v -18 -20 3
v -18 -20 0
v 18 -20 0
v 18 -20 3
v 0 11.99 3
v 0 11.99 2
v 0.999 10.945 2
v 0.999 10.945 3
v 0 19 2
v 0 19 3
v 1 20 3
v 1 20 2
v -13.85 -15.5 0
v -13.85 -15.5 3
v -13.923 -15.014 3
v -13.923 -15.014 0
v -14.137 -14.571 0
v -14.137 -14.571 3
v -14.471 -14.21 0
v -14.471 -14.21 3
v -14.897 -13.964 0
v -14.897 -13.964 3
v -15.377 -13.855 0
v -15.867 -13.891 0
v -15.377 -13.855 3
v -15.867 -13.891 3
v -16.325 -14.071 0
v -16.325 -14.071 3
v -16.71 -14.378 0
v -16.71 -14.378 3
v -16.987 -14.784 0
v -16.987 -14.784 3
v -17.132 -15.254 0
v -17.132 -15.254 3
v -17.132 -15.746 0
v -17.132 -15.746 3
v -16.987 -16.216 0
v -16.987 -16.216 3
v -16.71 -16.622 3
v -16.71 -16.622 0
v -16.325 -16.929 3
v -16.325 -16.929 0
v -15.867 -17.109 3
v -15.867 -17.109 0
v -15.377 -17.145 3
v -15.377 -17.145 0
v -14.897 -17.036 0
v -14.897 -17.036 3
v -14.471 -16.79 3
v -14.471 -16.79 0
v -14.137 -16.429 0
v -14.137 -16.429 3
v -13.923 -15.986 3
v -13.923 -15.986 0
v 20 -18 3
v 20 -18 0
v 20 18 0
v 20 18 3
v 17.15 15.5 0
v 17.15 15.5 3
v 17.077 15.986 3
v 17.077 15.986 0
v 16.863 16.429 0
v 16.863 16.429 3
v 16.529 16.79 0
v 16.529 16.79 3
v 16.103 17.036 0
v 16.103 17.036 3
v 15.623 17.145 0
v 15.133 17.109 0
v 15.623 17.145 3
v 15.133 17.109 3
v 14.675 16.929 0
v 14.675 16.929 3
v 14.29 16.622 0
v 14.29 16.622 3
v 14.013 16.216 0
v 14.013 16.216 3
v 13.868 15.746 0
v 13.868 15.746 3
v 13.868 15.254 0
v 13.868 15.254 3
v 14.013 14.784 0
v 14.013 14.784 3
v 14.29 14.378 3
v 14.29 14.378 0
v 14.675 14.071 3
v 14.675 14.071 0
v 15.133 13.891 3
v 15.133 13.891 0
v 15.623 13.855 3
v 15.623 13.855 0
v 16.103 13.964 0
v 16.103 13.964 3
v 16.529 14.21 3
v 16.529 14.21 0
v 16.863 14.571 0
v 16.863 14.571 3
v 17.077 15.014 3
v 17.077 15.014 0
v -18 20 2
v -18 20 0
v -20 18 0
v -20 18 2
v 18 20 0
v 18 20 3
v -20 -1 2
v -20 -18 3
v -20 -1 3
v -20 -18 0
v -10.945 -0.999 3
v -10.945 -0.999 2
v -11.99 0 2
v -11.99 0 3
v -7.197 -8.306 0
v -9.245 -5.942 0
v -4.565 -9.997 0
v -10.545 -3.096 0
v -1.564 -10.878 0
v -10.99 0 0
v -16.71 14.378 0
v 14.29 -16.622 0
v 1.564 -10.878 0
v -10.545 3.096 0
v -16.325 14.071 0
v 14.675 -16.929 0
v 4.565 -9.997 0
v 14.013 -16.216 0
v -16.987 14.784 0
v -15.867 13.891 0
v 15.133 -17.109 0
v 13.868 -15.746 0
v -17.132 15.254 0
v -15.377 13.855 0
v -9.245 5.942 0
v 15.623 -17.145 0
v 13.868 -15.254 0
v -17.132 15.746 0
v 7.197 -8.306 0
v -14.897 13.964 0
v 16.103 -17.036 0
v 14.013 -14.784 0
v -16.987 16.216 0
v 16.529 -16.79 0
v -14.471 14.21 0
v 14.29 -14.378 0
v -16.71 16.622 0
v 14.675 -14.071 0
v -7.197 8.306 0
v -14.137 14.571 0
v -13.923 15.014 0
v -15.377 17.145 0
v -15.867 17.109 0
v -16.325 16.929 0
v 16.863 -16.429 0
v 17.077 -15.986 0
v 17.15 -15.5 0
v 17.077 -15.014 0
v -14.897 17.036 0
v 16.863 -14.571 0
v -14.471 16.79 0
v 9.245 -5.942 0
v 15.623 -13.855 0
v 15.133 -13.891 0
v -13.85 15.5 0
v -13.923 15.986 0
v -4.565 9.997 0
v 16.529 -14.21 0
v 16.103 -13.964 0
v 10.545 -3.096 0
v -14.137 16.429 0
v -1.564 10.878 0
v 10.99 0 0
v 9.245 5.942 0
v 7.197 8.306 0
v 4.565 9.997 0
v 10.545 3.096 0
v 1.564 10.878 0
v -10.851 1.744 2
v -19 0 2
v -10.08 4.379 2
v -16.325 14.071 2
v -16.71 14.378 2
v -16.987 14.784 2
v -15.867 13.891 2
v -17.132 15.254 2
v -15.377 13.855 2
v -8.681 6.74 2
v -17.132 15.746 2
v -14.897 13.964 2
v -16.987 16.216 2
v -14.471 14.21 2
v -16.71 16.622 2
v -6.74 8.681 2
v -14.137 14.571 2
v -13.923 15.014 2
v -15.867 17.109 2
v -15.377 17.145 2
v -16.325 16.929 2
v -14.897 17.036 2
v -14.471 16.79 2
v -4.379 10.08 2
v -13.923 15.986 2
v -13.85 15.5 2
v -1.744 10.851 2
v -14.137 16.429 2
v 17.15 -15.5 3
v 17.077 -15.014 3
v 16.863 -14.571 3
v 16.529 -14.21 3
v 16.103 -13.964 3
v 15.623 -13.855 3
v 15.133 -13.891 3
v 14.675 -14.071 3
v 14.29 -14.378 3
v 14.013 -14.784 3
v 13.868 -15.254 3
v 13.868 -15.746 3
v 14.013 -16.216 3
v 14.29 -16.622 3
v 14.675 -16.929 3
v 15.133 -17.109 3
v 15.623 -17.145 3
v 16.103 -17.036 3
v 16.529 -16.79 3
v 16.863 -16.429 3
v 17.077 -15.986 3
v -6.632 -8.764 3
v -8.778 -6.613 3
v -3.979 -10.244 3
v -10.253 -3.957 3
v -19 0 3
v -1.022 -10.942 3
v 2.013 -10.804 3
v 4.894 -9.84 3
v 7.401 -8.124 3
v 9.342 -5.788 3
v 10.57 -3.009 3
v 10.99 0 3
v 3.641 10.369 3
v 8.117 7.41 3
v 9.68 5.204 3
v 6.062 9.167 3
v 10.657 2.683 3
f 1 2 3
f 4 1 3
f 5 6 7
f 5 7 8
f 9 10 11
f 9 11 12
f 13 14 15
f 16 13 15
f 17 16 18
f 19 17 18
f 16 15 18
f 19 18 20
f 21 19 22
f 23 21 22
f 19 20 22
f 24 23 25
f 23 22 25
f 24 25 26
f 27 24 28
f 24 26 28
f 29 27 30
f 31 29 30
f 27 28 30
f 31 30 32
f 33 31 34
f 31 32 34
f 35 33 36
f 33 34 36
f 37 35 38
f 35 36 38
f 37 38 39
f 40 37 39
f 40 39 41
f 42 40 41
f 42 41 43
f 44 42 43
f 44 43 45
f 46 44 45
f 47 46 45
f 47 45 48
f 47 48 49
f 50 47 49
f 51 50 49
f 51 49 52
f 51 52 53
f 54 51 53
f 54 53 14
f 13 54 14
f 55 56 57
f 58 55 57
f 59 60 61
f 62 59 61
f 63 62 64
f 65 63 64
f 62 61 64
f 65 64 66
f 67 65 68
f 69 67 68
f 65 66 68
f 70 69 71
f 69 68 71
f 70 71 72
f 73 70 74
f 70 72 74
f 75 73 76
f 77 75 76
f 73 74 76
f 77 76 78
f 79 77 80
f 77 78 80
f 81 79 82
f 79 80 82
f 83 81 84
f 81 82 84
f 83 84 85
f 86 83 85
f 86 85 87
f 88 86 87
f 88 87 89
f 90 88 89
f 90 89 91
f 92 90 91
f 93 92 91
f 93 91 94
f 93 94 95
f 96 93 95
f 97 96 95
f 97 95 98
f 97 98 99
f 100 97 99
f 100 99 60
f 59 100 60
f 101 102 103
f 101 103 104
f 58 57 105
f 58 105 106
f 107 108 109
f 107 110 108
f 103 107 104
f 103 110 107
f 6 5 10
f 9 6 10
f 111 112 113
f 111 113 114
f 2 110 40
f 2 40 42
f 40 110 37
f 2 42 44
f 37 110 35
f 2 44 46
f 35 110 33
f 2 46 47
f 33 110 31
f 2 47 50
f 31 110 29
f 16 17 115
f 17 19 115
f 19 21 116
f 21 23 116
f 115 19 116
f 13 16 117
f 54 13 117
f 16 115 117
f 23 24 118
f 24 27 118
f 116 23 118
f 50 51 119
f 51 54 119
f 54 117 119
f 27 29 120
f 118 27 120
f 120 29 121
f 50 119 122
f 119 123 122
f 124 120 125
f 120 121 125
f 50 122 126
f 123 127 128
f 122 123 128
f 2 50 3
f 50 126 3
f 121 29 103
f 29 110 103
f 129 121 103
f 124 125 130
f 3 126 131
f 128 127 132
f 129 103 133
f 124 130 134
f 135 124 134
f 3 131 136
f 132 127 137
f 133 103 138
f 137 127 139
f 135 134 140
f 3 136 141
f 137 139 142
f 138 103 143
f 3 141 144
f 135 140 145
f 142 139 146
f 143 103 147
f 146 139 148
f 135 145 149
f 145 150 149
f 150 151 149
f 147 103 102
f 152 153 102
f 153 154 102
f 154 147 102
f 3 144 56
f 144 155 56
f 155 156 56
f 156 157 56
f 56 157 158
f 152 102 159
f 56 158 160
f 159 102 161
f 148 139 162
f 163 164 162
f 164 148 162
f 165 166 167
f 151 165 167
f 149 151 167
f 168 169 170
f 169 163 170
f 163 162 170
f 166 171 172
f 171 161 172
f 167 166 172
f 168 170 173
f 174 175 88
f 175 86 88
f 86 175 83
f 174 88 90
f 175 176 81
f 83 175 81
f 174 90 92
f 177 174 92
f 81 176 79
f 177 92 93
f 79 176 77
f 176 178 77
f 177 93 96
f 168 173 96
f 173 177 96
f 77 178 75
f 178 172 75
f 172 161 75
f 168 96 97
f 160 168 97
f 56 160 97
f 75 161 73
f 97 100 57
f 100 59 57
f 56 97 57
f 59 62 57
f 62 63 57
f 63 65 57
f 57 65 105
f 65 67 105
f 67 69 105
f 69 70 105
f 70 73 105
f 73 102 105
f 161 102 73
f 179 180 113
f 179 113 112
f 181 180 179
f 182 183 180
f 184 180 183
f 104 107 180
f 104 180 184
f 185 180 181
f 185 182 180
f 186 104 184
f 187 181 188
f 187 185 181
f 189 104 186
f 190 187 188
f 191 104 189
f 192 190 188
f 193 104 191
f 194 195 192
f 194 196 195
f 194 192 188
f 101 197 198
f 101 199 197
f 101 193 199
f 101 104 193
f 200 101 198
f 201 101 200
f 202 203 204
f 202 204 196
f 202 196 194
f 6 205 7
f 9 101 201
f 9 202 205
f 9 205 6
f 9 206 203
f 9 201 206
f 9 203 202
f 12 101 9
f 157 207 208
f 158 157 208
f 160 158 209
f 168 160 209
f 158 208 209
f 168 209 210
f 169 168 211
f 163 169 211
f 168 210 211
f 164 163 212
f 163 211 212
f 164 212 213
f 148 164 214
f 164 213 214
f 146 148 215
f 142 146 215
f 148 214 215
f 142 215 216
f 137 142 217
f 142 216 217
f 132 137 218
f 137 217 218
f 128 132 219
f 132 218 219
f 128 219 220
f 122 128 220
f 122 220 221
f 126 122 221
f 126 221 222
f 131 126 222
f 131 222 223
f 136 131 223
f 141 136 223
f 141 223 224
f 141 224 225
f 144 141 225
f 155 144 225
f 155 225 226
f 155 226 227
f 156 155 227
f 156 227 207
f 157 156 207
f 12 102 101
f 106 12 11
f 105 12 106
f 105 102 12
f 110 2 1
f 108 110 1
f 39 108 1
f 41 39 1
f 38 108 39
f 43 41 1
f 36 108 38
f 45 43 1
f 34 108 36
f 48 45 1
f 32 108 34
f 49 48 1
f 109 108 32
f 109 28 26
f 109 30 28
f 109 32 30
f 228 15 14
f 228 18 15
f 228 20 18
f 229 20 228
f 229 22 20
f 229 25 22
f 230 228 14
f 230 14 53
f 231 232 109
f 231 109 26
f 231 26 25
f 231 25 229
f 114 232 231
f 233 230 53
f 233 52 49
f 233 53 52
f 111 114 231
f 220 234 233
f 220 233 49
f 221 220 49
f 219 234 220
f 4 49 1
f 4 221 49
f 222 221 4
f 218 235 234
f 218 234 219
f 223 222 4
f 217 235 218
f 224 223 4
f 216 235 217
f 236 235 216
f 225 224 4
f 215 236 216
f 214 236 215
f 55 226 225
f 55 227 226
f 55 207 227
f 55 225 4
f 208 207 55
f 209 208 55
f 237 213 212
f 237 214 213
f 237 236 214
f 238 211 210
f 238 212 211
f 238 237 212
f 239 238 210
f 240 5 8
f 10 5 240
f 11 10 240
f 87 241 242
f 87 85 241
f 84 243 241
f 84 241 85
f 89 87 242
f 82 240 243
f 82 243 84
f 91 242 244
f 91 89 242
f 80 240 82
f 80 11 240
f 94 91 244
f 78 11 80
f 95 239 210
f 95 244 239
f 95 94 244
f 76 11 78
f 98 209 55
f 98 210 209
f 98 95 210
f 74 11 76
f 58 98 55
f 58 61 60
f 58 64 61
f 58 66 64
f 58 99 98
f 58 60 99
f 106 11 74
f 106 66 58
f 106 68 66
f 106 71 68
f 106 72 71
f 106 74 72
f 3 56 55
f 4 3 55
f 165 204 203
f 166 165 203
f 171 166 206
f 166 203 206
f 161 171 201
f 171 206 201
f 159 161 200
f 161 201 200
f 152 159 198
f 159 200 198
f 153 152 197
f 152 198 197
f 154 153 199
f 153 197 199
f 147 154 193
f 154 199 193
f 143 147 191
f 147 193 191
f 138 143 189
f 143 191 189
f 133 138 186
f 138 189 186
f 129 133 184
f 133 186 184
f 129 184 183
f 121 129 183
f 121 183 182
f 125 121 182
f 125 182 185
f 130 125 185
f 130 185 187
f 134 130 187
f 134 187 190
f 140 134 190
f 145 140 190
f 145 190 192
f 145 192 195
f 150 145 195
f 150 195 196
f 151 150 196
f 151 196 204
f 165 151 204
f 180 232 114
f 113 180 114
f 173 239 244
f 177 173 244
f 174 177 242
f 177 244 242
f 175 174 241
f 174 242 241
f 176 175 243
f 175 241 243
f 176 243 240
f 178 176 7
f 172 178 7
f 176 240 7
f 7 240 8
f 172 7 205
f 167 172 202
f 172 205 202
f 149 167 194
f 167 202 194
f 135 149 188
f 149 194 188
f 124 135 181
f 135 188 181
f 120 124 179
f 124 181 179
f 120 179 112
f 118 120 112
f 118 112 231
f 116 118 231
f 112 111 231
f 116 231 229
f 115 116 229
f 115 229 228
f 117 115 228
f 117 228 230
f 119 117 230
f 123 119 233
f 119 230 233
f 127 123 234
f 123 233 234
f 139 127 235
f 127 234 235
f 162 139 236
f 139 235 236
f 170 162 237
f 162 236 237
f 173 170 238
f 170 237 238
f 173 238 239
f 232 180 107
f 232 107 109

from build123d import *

# Parameters (mm, degrees)
SKETCH_W        = 40
SKETCH_H        = 40
PAD_DEPTH       = 3
SKETCH001_R     = 10.99
SKETCH001_R_2   = 1.65
POCKET_DEPTH    = 5
SKETCH003_W     = 37.54295
SKETCH003_H     = 30.927837
POCKET001_DEPTH = 1
CHAMFER_SIZE    = 2
CHAMFER001_SIZE = 1


with BuildPart() as part:
    # Sketch → Pad (new body)
    with BuildSketch(Plane.XY):
        Rectangle(SKETCH_W, SKETCH_H)
    extrude(amount=PAD_DEPTH)

    # Sketch001 (on Face6 of Pad) → Pocket (cut)
    with BuildSketch(Plane.XY.offset(3)):
        Circle(SKETCH001_R)
        with Locations((-15.5, 15.5)):
            Circle(SKETCH001_R_2)
        with Locations((15.5, 15.5)):
            Circle(SKETCH001_R_2)
        with Locations((-15.5, -15.5)):
            Circle(SKETCH001_R_2)
        with Locations((15.5, -15.5)):
            Circle(SKETCH001_R_2)
    extrude(amount=-POCKET_DEPTH, mode=Mode.SUBTRACT)

    # Sketch003 (on Face5 of Pocket) → Pocket001 (cut)
    with BuildSketch(Plane.XY.offset(3)):
        with Locations((-18.771475, 15.463919)):
            Rectangle(SKETCH003_W, SKETCH003_H)
    extrude(amount=-POCKET001_DEPTH, mode=Mode.SUBTRACT)

    # Chamfer
    chamfer_edges = [part.edges().sort_by_distance(p)[0] for p in [
        (-20, -20, 1.5),
        (20, -20, 1.5),
        (20, 20, 1.5),
        (-20, 20, 1),
    ]]
    chamfer(chamfer_edges, length=CHAMFER_SIZE)

    # Chamfer001
    chamfer001_edges = [part.edges().sort_by_distance(p)[0] for p in [
        (-10.99, 0, 2.5),
        (0, 20, 2.5),
        (0, 10.99, 2.5),
        (-20, 0, 2.5),
    ]]
    chamfer(chamfer001_edges, length=CHAMFER001_SIZE)


solid = part.part
